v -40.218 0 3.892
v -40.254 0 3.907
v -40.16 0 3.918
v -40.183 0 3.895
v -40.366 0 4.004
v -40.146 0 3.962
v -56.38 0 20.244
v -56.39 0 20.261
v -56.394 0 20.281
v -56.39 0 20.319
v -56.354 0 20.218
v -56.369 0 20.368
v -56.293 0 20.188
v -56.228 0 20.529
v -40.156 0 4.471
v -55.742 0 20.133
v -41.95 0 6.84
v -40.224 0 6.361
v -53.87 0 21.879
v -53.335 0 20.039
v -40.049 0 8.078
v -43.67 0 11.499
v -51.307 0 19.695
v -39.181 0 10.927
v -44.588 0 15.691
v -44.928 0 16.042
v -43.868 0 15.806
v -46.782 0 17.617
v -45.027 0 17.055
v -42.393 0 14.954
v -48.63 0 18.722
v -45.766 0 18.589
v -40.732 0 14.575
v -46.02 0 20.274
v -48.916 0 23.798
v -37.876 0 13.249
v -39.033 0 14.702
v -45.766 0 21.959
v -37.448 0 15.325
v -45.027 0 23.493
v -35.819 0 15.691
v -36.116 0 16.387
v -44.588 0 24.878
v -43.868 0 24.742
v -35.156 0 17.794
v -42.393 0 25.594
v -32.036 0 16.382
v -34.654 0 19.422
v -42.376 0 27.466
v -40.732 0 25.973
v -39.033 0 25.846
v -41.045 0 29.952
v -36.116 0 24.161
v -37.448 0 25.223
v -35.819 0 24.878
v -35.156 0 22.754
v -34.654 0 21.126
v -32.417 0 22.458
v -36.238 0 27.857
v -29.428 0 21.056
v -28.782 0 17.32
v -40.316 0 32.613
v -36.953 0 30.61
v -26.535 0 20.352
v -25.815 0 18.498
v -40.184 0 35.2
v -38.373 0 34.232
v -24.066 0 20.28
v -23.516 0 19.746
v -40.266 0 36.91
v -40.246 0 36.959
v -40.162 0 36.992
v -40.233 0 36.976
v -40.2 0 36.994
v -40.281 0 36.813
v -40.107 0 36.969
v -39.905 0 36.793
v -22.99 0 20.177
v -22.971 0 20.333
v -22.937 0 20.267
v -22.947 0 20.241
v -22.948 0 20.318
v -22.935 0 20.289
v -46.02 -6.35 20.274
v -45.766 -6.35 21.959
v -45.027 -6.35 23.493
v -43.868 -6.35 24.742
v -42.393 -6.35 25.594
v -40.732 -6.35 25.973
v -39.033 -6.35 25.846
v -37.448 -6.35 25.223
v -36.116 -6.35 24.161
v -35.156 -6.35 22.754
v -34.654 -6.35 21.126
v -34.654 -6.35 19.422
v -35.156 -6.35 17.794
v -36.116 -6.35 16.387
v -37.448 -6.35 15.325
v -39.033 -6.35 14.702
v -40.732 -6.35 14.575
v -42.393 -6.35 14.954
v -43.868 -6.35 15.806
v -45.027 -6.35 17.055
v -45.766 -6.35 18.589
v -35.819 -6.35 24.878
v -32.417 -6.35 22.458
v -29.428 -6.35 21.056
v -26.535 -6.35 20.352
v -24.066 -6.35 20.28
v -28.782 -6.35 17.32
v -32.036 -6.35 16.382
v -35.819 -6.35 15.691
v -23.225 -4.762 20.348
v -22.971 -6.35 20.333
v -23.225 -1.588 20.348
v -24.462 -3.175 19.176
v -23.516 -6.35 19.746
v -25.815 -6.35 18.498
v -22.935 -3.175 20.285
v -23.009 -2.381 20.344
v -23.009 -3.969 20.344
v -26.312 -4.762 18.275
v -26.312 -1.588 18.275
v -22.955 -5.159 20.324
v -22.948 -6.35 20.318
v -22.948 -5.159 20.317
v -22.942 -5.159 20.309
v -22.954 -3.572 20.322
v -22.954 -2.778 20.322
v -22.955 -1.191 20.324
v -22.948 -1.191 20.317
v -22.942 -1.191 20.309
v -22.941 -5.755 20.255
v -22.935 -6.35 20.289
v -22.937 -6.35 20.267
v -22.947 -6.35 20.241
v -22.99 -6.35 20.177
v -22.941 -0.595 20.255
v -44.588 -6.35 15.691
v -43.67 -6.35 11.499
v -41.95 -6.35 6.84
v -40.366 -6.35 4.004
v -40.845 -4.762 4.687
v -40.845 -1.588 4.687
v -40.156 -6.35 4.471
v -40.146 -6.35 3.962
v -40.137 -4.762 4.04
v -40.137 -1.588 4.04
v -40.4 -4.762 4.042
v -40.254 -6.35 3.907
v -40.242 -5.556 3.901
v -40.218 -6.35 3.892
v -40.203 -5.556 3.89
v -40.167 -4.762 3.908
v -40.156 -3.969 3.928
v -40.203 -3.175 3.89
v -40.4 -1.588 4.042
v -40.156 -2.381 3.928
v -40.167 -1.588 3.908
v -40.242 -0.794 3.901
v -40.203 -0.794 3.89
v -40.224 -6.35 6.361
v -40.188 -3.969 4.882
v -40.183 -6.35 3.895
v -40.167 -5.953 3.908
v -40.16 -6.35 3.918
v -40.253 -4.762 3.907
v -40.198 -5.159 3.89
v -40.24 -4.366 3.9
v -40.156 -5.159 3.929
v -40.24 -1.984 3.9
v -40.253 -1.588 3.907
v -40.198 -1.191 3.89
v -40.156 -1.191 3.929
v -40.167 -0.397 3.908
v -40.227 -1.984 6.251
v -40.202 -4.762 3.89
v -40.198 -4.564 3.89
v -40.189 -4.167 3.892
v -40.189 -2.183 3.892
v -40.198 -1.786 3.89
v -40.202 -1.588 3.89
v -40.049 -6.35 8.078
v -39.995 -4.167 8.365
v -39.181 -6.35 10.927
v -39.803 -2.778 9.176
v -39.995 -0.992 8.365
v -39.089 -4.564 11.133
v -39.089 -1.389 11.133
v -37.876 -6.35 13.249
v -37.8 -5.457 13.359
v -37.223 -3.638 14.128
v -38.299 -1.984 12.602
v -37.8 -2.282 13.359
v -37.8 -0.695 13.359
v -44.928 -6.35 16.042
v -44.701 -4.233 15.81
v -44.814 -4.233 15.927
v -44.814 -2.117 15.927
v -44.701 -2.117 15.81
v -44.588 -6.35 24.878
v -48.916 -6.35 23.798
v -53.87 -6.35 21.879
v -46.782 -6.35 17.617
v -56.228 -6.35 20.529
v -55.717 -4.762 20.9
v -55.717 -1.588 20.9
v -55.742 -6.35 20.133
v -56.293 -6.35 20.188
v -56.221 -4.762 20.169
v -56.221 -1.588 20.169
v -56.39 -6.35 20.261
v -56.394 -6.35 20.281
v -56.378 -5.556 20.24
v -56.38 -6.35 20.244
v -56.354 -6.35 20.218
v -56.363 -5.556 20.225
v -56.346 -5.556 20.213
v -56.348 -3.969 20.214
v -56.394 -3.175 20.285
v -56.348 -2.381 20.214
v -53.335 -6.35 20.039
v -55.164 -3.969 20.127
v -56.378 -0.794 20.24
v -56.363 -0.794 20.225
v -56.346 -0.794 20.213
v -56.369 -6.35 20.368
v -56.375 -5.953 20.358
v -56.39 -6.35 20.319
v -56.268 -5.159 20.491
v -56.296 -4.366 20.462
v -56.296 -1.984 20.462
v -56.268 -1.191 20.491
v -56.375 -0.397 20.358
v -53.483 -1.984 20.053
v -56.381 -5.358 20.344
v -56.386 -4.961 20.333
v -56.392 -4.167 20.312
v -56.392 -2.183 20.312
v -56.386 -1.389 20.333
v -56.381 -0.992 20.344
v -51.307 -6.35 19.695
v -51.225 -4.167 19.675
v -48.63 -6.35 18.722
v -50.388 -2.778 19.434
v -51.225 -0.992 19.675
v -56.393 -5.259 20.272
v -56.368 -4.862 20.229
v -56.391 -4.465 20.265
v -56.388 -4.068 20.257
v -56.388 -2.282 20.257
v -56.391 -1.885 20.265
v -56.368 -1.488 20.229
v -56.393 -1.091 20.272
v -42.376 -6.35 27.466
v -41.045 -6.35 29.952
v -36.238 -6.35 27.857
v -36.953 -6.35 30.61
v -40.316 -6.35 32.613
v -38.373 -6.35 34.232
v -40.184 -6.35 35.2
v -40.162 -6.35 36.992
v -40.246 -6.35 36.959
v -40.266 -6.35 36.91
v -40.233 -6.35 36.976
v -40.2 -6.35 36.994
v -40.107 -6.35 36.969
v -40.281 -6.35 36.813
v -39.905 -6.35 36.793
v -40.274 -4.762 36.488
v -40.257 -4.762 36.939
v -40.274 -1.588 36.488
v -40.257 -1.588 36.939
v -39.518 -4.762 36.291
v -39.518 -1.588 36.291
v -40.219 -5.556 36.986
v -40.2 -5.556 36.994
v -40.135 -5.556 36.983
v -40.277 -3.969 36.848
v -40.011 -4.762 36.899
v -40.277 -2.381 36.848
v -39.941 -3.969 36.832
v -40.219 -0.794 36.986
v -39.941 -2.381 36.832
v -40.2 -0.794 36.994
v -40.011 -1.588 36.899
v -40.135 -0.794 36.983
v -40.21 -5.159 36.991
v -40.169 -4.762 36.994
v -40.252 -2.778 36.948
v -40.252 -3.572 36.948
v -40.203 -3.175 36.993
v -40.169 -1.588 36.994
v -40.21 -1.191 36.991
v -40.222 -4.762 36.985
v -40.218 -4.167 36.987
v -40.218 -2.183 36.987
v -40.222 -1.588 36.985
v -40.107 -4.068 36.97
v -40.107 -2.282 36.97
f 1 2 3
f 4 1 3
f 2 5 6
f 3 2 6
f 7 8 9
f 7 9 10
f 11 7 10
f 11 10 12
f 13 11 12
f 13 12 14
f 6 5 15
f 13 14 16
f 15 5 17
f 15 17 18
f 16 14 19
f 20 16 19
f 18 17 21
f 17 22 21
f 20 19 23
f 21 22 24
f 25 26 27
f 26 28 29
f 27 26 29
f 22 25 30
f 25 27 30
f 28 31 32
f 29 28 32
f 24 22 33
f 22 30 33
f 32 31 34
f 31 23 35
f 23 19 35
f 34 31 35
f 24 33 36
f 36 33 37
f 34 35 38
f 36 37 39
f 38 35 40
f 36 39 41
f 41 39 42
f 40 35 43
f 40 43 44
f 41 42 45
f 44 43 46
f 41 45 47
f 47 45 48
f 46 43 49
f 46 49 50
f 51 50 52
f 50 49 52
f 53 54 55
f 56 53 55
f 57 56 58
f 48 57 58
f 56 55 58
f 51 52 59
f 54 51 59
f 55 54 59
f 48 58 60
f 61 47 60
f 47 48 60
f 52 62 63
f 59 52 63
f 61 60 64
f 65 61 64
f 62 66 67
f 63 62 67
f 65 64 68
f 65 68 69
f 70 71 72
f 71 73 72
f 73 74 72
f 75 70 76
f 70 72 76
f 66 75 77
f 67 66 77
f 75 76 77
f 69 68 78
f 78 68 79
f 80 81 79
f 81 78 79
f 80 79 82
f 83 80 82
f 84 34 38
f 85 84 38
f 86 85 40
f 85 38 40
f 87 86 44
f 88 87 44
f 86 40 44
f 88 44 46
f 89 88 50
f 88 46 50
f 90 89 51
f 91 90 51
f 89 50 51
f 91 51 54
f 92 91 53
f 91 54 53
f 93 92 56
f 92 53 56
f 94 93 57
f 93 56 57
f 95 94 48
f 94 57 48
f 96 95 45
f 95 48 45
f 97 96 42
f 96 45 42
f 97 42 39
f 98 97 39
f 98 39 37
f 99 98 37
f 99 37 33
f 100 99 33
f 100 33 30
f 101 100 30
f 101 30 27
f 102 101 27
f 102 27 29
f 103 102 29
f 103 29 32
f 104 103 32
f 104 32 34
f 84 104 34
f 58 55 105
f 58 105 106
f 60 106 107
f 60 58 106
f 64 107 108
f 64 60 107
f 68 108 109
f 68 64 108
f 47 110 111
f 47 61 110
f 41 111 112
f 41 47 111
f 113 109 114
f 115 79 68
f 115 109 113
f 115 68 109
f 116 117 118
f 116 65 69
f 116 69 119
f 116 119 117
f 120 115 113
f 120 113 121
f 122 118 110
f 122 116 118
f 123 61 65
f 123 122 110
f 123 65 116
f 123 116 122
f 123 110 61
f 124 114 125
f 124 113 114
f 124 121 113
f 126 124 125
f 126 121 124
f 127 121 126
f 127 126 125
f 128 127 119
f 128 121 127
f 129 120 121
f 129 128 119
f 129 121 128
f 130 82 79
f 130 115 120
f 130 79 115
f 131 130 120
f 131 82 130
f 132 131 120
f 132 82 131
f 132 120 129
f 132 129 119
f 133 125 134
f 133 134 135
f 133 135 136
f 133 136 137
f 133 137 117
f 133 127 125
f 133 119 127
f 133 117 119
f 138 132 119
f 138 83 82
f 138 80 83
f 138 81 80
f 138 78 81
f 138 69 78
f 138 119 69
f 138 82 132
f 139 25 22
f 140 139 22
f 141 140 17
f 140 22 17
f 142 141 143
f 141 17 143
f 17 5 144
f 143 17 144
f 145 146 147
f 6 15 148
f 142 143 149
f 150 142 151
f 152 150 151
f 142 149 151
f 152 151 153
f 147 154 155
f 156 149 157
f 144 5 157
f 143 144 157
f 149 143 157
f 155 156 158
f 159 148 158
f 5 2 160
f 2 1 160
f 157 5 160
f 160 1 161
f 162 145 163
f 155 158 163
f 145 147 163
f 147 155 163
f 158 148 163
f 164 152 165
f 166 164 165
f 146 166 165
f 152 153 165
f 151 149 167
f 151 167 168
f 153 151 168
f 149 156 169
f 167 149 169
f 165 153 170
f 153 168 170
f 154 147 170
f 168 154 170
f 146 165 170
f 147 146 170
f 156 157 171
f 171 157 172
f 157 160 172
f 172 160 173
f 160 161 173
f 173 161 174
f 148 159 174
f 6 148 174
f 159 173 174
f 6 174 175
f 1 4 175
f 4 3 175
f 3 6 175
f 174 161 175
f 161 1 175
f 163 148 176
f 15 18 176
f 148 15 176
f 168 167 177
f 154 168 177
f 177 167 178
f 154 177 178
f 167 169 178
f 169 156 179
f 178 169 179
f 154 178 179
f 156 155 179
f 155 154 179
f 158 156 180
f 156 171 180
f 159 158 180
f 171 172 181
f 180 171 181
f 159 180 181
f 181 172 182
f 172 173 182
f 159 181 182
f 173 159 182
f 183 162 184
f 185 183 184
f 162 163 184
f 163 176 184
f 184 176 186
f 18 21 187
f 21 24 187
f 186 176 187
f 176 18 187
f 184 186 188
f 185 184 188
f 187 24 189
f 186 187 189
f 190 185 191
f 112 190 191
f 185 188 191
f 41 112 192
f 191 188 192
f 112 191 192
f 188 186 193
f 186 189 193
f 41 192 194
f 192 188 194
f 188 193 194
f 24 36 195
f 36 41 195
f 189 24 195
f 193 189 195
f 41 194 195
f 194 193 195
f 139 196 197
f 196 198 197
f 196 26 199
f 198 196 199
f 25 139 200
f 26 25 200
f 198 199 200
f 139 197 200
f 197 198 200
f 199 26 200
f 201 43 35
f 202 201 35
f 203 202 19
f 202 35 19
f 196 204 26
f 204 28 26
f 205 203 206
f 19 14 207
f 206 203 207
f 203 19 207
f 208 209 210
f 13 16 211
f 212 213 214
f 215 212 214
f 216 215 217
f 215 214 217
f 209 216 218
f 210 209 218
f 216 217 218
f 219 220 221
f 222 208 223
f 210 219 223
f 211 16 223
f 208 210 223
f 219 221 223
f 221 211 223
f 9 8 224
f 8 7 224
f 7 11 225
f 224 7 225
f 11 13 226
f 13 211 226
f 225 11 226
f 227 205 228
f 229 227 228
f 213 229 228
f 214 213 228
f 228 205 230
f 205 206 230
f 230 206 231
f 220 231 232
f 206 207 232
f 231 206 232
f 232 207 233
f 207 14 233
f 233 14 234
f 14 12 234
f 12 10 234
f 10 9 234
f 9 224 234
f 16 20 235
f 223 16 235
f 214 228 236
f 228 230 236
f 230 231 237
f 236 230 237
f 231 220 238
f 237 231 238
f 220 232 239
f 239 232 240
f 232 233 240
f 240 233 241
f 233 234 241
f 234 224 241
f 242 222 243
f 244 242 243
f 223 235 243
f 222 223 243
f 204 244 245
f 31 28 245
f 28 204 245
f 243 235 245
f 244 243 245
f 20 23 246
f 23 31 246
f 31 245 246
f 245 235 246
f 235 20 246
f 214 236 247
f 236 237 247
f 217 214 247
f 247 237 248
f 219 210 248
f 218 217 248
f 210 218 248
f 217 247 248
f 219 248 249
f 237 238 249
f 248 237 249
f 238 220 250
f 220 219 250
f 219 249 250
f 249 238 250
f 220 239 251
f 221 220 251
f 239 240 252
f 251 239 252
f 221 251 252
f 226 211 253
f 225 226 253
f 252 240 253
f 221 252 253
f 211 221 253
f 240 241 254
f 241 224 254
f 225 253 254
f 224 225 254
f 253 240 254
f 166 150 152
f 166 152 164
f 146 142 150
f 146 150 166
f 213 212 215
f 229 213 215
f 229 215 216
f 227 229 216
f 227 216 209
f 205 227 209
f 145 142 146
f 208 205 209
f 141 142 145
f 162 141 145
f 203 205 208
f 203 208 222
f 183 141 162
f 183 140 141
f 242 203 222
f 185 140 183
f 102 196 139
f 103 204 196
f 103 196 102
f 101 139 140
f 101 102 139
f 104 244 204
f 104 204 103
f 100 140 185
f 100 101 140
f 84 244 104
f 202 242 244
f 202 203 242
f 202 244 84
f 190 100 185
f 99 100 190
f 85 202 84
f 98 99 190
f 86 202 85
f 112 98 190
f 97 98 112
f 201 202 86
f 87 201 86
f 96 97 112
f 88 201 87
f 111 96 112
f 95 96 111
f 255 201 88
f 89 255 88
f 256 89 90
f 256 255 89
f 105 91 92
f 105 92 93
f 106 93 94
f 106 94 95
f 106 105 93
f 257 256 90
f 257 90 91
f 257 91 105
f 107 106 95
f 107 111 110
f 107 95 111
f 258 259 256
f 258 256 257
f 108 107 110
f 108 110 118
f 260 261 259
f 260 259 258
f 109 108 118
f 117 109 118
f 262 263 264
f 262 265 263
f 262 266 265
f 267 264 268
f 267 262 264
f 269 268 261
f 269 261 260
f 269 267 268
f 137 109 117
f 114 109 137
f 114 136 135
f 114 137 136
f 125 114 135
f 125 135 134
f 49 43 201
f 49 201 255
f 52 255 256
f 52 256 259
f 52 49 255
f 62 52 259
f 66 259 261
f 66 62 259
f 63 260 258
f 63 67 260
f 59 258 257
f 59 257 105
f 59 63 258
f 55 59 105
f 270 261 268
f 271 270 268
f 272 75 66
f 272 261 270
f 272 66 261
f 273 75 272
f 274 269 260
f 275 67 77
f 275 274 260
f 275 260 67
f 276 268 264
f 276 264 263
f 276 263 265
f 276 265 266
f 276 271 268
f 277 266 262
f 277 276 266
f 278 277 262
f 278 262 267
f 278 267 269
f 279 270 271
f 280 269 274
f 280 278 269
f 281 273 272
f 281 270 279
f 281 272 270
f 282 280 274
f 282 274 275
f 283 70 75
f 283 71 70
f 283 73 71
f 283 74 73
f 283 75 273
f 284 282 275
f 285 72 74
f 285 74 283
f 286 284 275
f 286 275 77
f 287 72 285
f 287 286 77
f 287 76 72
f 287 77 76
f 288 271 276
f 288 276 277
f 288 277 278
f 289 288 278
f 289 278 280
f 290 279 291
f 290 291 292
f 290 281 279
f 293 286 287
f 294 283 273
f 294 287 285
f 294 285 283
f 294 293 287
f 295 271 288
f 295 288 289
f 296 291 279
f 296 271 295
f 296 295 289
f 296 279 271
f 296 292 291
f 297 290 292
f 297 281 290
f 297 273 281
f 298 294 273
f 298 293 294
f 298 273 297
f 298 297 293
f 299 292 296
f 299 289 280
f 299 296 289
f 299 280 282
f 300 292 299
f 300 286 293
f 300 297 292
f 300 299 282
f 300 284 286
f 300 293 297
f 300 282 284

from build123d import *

# Parameters (mm, degrees)
F1_DEPTH = 6.35
F3_D     = 11.43
F3_DEPTH = 25.4


with BuildPart() as f1:
    # F0 (on Front) → F1 (new body)
    with BuildSketch(Plane.XZ):
        with BuildLine():
            ThreePointArc((-35.819092, 15.691353), (-34.365454, 17.786657), (-33.853378, 20.284886))
            ThreePointArc((-33.853378, 20.284886), (-34.365454, 22.783114), (-35.819092, 24.878418))
            ThreePointArc((-35.819092, 24.878418), (-40.203378, 26.634886), (-44.587663, 24.878418))
            ThreePointArc((-44.587663, 24.878418), (-46.548686, 20.528945), (-44.927549, 16.041691))
            add(Edge.make_bspline(
                [(-44.927549, 16.041691), (-44.81393, 15.92811), (-44.700614, 15.81136), (-44.587663, 15.691353)],
                knots=[25.075757, 25.075757, 25.075757, 25.075757, 25.337787, 25.337787, 25.337787, 25.337787], degree=3))
            ThreePointArc((-44.587663, 15.691353), (-40.203378, 13.934886), (-35.819092, 15.691353))
        make_face()
        with BuildLine():
            ThreePointArc((-44.587663, 24.878418), (-40.203378, 26.634886), (-35.819092, 24.878418))
            add(Edge.make_bspline(
                [(-44.587663, 24.878418), (-38.347919, 30.843824), (-43.083301, 42.885957), (-36.29899, 31.356057), (-35.819092, 24.878418)],
                knots=[0, 0, 0, 0, 12.88347, 25.76694, 25.76694, 25.76694, 25.76694], degree=3))
        make_face()
        with BuildLine():
            ThreePointArc((-44.927549, 16.041691), (-46.548686, 20.528945), (-44.587663, 24.878418))
            add(Edge.make_bspline(
                [(-44.587663, 24.878418), (-50.169606, 23.91101), (-62.550365, 17.929967), (-50.307292, 21.41963), (-44.927549, 16.041691)],
                knots=[0, 0, 0, 0, 12.668893, 25.075757, 25.075757, 25.075757, 25.075757], degree=3))
        make_face()
        with BuildLine():
            add(Edge.make_bspline(
                [(-44.587663, 15.691353), (-43.733824, 9.608083), (-37.574358, -1.828031), (-41.93097, 9.608083), (-35.819092, 15.691353)],
                knots=[0, 0, 0, 0, 12.589411, 25.178822, 25.178822, 25.178822, 25.178822], degree=3))
            ThreePointArc((-35.819092, 15.691353), (-40.203378, 13.934886), (-44.587663, 15.691353))
        make_face()
        with BuildLine():
            ThreePointArc((-35.819092, 24.878418), (-34.365454, 22.783114), (-33.853378, 20.284886))
            ThreePointArc((-33.853378, 20.284886), (-34.365454, 17.786657), (-35.819092, 15.691353))
            add(Edge.make_bspline(
                [(-35.819092, 24.878418), (-28.212329, 18.476849), (-17.657736, 22.999454), (-28.212329, 16.663786), (-35.819092, 15.691353)],
                knots=[0, 0, 0, 0, 13.678433, 27.356866, 27.356866, 27.356866, 27.356866], degree=3))
        make_face()
    extrude(amount=F1_DEPTH)

    # F3
    with Locations(Plane.XZ.offset(6.35)):
        with Locations((-40.305141, 20.274019)):
            Hole(F3_D / 2, depth=F3_DEPTH)


solid = f1.part
